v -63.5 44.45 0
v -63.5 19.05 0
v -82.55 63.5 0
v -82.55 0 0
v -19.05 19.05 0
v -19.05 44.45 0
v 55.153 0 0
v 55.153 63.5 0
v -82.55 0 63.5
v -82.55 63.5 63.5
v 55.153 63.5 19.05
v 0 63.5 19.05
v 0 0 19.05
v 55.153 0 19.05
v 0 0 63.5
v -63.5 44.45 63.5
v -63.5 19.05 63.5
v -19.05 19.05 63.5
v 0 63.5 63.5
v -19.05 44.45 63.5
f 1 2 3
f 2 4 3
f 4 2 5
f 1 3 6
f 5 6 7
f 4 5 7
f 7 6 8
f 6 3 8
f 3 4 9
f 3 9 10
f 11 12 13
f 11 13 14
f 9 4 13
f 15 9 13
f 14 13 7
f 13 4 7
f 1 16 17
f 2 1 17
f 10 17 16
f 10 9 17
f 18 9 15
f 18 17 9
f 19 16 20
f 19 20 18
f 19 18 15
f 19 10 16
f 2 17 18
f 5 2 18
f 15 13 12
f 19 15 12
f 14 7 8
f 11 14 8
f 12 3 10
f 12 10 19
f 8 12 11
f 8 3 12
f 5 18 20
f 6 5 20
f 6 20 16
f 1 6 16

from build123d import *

# Parameters (mm, degrees)
F0_W     = 82.55
F0_H     = 63.5
F1_DEPTH = 63.5
F0_W_2   = 55.153496
F2_DEPTH = 19.05
F4_DEPTH = 63.501


with BuildPart() as f1:
    # F0 (on Top) → F1 (new body)
    with BuildSketch(Plane.XY):
        with Locations((-41.275, 31.75)):
            Rectangle(F0_W, F0_H)
    extrude(amount=F1_DEPTH)

    # F0 (on Top) → F2 (join)
    with BuildSketch(Plane.XY):
        with Locations((27.576748, 31.75)):
            Rectangle(F0_W_2, F0_H)
    extrude(amount=F2_DEPTH)

    # F3 (on face) → F4 (cut, through all)
    with BuildSketch(Plane.XY.offset(63.5)):
        Polygon((-63.5, 44.45), (-63.5, 31.75), (-63.5, 19.05), (-41.275, 19.05), (-19.05, 19.05), (-19.05, 31.75), (-19.05, 44.45), (-41.275, 44.45), align=None)
    extrude(amount=-F4_DEPTH, mode=Mode.SUBTRACT)


solid = f1.part
